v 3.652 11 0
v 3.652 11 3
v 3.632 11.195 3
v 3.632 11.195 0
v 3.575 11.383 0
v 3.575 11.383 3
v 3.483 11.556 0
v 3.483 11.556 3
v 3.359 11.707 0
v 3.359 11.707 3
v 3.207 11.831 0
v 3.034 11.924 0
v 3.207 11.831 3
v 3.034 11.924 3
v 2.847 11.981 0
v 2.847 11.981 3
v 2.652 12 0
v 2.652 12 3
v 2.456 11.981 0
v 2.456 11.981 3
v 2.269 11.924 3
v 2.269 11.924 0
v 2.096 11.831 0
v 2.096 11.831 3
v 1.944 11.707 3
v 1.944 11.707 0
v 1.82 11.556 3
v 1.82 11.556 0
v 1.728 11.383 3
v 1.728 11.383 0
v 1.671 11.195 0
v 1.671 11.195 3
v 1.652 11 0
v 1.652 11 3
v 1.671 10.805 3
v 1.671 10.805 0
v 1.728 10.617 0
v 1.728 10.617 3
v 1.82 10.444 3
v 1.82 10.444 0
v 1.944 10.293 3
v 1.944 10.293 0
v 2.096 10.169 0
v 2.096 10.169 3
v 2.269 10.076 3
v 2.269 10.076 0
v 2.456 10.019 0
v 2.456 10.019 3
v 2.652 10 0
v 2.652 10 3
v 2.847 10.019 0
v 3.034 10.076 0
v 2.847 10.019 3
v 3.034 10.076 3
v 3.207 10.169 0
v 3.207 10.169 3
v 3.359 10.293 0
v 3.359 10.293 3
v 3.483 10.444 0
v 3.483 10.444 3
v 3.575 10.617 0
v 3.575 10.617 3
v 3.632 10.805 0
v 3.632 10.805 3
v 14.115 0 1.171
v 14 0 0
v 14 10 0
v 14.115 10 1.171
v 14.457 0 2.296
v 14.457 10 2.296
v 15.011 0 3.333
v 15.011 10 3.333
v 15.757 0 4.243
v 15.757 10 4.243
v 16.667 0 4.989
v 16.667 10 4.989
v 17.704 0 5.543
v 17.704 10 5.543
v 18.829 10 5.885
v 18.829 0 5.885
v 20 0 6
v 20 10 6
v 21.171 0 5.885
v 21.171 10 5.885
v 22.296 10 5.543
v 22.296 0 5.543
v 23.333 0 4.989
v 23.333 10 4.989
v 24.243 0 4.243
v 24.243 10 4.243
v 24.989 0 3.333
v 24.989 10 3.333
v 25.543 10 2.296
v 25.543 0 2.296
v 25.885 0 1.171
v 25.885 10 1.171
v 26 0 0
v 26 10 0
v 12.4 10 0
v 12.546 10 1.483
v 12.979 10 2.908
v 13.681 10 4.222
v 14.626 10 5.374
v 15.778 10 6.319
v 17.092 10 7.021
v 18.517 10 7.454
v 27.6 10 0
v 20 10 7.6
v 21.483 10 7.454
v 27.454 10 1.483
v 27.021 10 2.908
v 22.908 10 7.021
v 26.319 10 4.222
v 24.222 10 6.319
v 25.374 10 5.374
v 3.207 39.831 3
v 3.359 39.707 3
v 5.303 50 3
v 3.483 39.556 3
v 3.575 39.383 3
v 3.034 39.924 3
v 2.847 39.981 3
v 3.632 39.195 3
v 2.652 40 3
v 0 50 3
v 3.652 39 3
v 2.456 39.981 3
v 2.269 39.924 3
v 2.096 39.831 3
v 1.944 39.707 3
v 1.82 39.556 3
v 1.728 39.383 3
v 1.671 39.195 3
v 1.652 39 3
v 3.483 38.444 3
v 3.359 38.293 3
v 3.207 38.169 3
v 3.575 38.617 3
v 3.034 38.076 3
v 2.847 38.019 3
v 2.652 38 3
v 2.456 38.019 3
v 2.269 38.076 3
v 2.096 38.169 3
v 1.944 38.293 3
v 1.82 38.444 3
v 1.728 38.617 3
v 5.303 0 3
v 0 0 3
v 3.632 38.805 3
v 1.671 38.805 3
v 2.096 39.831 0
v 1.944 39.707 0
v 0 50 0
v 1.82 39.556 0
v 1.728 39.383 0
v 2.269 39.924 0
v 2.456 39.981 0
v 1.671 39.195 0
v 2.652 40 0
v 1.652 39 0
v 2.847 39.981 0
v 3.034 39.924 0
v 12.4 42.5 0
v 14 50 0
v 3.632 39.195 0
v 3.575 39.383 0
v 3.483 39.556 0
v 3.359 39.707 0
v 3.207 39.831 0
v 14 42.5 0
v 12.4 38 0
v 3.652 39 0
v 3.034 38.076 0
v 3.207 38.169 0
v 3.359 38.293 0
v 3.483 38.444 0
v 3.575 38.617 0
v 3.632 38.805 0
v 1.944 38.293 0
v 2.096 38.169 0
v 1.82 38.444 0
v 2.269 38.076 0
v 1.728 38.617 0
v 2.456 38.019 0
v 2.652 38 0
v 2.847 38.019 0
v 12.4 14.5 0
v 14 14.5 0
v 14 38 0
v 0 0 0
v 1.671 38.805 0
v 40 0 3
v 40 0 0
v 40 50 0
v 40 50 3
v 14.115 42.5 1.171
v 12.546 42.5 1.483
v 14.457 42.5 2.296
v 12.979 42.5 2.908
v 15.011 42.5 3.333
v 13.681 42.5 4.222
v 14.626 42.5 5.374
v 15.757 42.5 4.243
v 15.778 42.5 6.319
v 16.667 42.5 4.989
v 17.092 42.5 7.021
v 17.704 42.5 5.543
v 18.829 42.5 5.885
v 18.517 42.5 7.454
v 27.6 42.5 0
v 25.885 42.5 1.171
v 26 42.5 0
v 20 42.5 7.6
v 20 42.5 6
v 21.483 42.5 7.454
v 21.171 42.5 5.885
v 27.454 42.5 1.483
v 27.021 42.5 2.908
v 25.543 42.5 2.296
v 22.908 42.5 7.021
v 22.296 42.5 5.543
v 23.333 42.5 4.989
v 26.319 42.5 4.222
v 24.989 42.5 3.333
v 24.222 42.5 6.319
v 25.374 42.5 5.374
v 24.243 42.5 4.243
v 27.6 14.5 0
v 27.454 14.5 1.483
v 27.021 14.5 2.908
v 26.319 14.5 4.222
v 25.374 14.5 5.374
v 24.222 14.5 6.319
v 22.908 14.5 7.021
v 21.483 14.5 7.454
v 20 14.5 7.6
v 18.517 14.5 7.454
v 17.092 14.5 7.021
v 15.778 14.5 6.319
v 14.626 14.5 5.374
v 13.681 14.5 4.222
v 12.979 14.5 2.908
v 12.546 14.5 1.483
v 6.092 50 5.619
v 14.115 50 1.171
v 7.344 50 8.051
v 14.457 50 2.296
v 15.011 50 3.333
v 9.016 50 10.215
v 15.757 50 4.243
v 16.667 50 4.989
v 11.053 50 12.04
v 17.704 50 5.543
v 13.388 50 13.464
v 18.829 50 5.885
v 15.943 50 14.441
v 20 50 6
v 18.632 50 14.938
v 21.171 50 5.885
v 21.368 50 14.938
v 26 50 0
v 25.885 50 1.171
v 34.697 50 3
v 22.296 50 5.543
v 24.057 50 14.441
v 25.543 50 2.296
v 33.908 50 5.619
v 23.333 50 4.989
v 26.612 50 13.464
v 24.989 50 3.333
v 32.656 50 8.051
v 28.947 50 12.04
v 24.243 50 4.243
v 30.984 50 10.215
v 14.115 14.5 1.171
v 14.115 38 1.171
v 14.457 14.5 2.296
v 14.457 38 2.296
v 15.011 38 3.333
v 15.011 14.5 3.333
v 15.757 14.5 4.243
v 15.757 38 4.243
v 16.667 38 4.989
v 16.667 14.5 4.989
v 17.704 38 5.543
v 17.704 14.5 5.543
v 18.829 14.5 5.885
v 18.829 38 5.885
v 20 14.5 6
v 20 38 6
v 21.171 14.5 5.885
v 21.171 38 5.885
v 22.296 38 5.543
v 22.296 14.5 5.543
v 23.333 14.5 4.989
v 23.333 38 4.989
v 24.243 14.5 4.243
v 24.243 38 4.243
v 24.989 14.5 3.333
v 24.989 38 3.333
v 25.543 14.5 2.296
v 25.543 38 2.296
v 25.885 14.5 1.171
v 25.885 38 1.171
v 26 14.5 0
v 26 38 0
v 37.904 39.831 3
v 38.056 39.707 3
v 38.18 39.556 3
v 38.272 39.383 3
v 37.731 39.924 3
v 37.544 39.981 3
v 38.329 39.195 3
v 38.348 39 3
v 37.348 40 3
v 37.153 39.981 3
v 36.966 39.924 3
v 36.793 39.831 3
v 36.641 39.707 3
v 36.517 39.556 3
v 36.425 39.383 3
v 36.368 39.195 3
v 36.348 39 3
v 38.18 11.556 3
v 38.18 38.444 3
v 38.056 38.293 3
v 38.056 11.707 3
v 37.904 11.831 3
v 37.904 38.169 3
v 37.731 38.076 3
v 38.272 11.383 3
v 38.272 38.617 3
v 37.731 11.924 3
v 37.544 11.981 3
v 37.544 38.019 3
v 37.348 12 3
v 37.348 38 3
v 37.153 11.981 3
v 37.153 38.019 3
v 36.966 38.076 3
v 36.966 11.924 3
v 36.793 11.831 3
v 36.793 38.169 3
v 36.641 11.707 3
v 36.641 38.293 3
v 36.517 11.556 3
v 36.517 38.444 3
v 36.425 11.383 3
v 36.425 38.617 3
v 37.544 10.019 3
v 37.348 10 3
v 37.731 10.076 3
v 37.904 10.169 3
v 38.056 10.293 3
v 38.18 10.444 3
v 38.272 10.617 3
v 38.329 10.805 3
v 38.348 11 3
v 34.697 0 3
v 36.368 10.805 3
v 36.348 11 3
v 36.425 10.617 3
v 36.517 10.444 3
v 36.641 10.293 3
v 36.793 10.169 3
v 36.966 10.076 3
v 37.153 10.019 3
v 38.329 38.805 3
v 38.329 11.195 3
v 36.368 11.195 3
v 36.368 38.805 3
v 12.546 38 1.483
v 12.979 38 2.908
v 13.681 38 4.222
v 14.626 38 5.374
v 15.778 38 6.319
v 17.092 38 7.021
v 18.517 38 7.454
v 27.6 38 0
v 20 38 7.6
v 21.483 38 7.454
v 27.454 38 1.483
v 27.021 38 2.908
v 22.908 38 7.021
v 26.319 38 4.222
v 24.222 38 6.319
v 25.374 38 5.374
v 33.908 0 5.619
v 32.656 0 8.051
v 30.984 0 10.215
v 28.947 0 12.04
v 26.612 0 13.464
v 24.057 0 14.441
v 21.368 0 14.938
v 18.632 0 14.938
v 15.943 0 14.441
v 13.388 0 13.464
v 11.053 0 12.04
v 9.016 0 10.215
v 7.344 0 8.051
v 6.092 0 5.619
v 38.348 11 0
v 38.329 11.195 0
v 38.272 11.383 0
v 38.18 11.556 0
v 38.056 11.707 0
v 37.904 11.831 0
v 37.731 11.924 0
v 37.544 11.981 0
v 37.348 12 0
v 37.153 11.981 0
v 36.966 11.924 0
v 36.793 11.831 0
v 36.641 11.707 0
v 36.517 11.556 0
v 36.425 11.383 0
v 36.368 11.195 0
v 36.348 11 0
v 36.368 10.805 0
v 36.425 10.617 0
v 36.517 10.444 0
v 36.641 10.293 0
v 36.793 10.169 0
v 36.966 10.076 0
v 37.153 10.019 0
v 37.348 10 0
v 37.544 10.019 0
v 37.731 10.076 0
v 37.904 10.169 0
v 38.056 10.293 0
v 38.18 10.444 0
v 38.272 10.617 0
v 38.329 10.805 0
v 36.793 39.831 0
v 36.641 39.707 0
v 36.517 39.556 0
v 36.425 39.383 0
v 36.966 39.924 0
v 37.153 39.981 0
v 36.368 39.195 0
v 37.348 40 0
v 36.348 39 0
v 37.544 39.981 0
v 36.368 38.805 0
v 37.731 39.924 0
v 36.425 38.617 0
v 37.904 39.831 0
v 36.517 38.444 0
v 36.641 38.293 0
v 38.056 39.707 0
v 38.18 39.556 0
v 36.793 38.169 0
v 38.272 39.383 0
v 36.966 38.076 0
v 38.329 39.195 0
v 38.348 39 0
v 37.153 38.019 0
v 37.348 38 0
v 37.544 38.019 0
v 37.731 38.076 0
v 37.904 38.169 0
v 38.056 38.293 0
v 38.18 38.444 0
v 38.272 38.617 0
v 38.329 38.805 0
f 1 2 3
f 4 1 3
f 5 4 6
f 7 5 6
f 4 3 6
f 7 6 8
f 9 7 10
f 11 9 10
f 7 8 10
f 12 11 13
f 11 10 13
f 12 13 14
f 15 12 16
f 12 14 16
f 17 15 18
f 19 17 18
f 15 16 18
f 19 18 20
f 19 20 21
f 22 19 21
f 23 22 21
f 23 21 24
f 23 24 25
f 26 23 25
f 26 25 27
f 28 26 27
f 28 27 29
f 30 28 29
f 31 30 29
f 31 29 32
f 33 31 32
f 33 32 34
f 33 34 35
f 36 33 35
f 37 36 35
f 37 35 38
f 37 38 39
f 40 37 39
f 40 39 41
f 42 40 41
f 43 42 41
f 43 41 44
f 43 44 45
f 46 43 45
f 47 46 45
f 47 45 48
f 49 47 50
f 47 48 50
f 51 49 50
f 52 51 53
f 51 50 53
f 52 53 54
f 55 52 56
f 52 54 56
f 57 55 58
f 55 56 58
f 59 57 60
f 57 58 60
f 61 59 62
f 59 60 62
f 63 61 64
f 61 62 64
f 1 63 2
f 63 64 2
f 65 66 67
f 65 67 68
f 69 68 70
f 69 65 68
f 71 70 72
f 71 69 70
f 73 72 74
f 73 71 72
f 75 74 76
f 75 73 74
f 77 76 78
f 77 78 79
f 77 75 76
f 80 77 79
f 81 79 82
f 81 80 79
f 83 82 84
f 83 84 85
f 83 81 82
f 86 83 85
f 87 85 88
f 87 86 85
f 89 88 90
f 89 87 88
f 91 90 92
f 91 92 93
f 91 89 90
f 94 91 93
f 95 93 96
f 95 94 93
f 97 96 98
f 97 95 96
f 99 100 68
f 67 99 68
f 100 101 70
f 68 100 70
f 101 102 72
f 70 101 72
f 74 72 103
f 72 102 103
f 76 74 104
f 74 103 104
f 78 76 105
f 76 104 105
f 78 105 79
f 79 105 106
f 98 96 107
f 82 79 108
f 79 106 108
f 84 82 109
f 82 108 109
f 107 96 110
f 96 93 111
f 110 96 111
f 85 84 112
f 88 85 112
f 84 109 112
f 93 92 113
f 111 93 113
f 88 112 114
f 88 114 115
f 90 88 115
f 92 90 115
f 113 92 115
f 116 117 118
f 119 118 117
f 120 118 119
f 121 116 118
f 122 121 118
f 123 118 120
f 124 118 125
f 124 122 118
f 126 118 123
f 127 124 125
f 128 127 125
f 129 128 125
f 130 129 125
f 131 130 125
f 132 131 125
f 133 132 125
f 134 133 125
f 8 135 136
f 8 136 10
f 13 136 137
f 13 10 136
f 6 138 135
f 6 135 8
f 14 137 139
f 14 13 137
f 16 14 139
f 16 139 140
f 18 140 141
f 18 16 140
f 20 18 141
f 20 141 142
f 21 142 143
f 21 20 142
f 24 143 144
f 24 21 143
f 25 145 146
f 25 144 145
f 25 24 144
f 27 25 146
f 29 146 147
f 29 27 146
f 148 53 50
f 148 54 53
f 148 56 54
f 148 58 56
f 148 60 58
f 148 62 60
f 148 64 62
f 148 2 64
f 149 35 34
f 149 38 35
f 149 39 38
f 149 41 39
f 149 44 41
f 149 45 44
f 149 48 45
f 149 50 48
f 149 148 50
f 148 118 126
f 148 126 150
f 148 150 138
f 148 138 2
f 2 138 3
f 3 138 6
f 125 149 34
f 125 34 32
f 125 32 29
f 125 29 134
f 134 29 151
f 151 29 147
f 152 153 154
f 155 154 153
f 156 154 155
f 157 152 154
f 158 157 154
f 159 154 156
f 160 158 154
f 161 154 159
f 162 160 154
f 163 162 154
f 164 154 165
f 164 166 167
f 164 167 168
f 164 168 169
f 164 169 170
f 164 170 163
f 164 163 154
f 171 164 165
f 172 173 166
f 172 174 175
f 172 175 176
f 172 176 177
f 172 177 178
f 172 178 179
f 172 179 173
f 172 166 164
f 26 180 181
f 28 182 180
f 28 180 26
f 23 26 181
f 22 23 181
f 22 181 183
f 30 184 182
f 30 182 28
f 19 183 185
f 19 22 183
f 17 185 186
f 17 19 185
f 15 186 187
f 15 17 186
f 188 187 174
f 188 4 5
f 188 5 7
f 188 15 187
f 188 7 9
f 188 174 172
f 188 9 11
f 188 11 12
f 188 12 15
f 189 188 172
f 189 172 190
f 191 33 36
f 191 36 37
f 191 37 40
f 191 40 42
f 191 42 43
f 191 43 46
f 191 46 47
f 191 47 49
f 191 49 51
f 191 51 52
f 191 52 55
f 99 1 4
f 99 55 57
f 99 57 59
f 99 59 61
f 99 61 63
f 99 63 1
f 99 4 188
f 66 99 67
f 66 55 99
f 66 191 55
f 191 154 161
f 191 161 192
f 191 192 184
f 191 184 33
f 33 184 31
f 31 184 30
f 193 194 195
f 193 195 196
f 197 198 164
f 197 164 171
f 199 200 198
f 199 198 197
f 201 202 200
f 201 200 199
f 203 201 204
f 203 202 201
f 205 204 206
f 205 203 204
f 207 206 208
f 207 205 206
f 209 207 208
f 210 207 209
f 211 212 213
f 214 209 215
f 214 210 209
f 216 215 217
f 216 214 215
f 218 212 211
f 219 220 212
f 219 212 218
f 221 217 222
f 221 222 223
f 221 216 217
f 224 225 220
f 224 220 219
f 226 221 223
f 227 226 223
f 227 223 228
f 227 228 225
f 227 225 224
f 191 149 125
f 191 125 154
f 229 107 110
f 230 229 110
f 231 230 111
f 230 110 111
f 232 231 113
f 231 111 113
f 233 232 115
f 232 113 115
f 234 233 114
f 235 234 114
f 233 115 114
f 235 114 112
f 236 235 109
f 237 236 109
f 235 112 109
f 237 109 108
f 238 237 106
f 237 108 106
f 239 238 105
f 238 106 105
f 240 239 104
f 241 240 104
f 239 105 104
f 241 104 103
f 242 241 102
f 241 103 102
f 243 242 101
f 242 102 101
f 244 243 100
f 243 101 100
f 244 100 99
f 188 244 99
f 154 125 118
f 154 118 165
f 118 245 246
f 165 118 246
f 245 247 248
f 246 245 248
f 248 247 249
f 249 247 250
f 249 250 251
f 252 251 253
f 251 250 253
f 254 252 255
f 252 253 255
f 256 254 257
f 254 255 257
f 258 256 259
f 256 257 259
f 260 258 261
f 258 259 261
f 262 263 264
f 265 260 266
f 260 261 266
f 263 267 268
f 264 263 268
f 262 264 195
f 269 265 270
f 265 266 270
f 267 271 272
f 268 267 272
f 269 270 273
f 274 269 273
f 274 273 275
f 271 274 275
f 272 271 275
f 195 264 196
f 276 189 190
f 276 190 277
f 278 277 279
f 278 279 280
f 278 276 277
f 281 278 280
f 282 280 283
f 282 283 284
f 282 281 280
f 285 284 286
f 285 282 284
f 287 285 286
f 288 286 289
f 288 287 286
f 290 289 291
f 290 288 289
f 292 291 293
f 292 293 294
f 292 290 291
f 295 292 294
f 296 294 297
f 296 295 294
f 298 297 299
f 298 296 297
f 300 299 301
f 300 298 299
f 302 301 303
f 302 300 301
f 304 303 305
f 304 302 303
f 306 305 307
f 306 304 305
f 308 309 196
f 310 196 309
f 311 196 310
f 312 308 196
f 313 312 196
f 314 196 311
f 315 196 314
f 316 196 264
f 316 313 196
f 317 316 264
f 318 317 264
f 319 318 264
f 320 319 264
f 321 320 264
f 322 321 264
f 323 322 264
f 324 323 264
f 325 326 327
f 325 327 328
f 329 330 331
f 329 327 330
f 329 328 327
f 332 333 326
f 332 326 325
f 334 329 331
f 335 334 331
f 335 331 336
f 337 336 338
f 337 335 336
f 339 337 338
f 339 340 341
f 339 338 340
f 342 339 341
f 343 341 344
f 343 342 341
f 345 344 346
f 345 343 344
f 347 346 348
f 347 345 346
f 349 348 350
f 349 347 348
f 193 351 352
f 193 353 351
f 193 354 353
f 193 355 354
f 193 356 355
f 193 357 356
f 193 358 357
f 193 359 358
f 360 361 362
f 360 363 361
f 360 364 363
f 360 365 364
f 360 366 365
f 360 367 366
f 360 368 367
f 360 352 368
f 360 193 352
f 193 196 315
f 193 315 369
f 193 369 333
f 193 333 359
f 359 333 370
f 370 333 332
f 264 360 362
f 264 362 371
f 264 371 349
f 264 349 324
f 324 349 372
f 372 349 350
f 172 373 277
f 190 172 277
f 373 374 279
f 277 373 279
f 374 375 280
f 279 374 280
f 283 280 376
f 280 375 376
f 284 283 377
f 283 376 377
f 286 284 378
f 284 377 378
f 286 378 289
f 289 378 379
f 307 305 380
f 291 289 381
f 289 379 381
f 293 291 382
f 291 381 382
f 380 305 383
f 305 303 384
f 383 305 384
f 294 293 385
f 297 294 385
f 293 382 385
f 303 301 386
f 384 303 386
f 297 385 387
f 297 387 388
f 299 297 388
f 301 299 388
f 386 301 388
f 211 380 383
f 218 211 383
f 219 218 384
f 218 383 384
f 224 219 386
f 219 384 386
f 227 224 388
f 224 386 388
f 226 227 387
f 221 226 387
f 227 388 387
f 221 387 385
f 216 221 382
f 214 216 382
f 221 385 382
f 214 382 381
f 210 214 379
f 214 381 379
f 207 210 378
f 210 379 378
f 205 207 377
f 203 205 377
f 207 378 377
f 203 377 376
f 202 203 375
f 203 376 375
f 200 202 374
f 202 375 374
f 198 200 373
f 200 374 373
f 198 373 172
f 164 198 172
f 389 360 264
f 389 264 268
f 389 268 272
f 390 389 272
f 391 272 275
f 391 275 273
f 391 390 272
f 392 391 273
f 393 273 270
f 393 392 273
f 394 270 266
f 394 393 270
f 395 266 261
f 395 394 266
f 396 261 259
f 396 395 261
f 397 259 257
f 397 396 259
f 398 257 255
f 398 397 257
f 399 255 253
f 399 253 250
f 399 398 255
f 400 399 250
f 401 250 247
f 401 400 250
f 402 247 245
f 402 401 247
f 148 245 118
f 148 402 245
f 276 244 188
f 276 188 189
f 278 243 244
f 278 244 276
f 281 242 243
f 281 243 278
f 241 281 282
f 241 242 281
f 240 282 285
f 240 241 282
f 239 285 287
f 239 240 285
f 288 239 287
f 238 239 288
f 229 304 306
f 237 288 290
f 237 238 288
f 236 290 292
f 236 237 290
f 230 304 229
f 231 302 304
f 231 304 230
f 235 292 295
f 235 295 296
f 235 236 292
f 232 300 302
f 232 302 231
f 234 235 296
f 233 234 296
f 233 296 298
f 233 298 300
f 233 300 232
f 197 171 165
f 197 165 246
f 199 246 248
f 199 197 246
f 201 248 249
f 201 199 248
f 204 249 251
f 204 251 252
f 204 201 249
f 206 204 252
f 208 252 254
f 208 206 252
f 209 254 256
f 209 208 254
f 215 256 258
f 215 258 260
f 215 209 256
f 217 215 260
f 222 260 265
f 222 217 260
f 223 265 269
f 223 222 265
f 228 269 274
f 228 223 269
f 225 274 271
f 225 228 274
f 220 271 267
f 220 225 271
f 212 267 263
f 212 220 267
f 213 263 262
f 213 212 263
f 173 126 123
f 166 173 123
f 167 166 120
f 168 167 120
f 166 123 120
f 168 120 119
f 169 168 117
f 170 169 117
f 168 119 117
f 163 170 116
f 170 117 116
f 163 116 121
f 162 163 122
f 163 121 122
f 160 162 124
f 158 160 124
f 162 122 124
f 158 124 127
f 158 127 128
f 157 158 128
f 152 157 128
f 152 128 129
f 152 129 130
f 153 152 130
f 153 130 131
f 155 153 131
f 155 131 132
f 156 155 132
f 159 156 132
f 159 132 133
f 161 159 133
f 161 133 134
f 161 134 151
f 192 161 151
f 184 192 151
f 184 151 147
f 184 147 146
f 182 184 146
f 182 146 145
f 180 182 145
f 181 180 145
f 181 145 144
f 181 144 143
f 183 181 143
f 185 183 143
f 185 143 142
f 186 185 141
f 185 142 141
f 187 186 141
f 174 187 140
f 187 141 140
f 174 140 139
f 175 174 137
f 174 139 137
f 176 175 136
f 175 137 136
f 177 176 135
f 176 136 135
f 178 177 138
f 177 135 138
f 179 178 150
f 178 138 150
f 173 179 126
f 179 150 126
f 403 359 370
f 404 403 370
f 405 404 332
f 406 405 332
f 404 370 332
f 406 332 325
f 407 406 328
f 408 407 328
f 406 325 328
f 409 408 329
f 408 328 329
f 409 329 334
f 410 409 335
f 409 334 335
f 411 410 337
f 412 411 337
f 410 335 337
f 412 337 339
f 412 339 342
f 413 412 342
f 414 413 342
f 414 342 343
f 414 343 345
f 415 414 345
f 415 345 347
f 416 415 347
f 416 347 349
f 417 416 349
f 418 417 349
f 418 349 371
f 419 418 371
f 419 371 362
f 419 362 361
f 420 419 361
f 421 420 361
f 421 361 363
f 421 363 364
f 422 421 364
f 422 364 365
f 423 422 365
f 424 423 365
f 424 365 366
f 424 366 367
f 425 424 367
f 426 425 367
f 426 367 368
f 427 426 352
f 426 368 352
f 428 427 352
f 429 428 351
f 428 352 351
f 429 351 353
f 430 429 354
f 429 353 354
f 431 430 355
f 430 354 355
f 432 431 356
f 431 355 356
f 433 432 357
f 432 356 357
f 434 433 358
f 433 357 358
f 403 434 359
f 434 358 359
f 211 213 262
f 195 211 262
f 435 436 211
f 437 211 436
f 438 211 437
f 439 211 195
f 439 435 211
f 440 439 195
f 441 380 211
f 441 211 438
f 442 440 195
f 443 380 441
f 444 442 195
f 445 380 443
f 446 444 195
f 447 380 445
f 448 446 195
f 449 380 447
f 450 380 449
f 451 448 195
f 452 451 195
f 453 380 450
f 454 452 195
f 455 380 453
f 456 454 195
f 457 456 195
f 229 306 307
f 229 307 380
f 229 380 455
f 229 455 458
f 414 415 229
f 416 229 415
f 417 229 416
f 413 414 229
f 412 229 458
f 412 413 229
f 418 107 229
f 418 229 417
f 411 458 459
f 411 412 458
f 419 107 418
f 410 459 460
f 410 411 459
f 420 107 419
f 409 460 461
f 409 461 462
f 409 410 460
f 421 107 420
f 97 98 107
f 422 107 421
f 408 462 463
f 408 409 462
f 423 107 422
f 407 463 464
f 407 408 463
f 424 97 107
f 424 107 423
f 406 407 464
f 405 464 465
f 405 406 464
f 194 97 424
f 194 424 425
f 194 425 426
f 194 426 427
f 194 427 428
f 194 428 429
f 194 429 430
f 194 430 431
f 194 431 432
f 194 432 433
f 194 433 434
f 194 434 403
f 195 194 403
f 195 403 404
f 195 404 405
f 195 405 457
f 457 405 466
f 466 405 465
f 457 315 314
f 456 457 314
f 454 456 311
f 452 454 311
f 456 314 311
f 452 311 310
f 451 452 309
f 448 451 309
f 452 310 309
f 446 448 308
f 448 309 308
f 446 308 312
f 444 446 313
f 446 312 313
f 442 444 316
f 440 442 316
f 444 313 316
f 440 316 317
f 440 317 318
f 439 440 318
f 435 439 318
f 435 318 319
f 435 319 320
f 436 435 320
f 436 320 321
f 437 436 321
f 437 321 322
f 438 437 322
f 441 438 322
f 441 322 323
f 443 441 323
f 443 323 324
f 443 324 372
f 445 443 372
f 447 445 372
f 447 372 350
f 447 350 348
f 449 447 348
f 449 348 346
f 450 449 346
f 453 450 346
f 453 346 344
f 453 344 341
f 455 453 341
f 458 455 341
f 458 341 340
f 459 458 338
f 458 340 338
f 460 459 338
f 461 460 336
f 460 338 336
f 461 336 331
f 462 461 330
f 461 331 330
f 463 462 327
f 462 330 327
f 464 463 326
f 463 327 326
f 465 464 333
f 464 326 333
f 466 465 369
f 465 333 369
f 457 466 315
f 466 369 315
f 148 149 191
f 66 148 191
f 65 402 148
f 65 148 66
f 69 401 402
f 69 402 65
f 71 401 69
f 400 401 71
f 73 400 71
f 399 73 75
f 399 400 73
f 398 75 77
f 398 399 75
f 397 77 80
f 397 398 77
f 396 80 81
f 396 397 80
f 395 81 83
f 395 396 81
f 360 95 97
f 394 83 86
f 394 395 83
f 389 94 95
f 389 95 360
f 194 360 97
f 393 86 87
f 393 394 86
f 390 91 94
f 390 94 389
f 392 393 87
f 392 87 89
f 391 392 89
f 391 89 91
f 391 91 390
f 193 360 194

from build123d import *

# Parameters (mm, degrees)
F1_DEPTH = 50
F4_DEPTH = 4.5
F5_START = -28
F5_DEPTH = 4.5
F6_R     = 1
F7_DEPTH = 25


with BuildPart() as f1:
    # F0 (on Front) → F1 (new body)
    with BuildSketch(Plane.XZ):
        with BuildLine():
            Line((0, 3), (0, 0))
            Line((0, 0), (5.0000003353, 0))
            ThreePointArc((5.0000003353, 0), (5.0759580419, 1.5076344304), (5.3030618855, 3))
            Line((5.3030618855, 3), (0, 3))
        make_face()
        with BuildLine():
            ThreePointArc((5.3030618855, 3), (5.0759580419, 1.5076344304), (5.0000003353, 0))
            Line((5.0000003353, 0), (14, 0))
            ThreePointArc((14, 0), (20, 6), (26, 0))
            Line((26, 0), (34.9999996647, 0))
            ThreePointArc((34.9999996647, 0), (34.9240419581, 1.5076344304), (34.6969381145, 3))
            ThreePointArc((34.6969381145, 3), (20, 14.9999996647), (5.3030618855, 3))
        make_face()
        with BuildLine():
            Line((40, 3), (34.6969381145, 3))
            ThreePointArc((34.6969381145, 3), (34.9240419581, 1.5076344304), (34.9999996647, 0))
            Line((34.9999996647, 0), (40, 0))
            Line((40, 0), (40, 3))
        make_face()
    extrude(amount=-F1_DEPTH)

    # F3 (on offset) → F4 (cut)
    with BuildSketch(Plane.XZ.offset(-10)):
        with BuildLine():
            Line((26, 0), (27.6, 0))
            ThreePointArc((27.6, 0), (20, 7.6), (12.4, 0))
            Line((12.4, 0), (14, 0))
            ThreePointArc((14, 0), (20, 6), (26, 0))
        make_face()
    extrude(amount=-F4_DEPTH, mode=Mode.SUBTRACT)

    # F3 (on offset) → F5 (cut)
    with BuildSketch(Plane.XZ.offset(-10).offset(F5_START)):
        with BuildLine():
            Line((26, 0), (27.6, 0))
            ThreePointArc((27.6, 0), (20, 7.6), (12.4, 0))
            Line((12.4, 0), (14, 0))
            ThreePointArc((14, 0), (20, 6), (26, 0))
        make_face()
    extrude(amount=-F5_DEPTH, mode=Mode.SUBTRACT)

    # F6 (on face) → F7 (cut)
    with BuildSketch(Plane.XY.offset(3)):
        with Locations((37.3484690573, 11)):
            Circle(F6_R)
        with Locations((37.3484690573, 39)):
            Circle(F6_R)
        with Locations((2.6515309427, 11)):
            Circle(F6_R)
        with Locations((2.6515309427, 39)):
            Circle(F6_R)
    extrude(amount=-F7_DEPTH, mode=Mode.SUBTRACT)


solid = f1.part
